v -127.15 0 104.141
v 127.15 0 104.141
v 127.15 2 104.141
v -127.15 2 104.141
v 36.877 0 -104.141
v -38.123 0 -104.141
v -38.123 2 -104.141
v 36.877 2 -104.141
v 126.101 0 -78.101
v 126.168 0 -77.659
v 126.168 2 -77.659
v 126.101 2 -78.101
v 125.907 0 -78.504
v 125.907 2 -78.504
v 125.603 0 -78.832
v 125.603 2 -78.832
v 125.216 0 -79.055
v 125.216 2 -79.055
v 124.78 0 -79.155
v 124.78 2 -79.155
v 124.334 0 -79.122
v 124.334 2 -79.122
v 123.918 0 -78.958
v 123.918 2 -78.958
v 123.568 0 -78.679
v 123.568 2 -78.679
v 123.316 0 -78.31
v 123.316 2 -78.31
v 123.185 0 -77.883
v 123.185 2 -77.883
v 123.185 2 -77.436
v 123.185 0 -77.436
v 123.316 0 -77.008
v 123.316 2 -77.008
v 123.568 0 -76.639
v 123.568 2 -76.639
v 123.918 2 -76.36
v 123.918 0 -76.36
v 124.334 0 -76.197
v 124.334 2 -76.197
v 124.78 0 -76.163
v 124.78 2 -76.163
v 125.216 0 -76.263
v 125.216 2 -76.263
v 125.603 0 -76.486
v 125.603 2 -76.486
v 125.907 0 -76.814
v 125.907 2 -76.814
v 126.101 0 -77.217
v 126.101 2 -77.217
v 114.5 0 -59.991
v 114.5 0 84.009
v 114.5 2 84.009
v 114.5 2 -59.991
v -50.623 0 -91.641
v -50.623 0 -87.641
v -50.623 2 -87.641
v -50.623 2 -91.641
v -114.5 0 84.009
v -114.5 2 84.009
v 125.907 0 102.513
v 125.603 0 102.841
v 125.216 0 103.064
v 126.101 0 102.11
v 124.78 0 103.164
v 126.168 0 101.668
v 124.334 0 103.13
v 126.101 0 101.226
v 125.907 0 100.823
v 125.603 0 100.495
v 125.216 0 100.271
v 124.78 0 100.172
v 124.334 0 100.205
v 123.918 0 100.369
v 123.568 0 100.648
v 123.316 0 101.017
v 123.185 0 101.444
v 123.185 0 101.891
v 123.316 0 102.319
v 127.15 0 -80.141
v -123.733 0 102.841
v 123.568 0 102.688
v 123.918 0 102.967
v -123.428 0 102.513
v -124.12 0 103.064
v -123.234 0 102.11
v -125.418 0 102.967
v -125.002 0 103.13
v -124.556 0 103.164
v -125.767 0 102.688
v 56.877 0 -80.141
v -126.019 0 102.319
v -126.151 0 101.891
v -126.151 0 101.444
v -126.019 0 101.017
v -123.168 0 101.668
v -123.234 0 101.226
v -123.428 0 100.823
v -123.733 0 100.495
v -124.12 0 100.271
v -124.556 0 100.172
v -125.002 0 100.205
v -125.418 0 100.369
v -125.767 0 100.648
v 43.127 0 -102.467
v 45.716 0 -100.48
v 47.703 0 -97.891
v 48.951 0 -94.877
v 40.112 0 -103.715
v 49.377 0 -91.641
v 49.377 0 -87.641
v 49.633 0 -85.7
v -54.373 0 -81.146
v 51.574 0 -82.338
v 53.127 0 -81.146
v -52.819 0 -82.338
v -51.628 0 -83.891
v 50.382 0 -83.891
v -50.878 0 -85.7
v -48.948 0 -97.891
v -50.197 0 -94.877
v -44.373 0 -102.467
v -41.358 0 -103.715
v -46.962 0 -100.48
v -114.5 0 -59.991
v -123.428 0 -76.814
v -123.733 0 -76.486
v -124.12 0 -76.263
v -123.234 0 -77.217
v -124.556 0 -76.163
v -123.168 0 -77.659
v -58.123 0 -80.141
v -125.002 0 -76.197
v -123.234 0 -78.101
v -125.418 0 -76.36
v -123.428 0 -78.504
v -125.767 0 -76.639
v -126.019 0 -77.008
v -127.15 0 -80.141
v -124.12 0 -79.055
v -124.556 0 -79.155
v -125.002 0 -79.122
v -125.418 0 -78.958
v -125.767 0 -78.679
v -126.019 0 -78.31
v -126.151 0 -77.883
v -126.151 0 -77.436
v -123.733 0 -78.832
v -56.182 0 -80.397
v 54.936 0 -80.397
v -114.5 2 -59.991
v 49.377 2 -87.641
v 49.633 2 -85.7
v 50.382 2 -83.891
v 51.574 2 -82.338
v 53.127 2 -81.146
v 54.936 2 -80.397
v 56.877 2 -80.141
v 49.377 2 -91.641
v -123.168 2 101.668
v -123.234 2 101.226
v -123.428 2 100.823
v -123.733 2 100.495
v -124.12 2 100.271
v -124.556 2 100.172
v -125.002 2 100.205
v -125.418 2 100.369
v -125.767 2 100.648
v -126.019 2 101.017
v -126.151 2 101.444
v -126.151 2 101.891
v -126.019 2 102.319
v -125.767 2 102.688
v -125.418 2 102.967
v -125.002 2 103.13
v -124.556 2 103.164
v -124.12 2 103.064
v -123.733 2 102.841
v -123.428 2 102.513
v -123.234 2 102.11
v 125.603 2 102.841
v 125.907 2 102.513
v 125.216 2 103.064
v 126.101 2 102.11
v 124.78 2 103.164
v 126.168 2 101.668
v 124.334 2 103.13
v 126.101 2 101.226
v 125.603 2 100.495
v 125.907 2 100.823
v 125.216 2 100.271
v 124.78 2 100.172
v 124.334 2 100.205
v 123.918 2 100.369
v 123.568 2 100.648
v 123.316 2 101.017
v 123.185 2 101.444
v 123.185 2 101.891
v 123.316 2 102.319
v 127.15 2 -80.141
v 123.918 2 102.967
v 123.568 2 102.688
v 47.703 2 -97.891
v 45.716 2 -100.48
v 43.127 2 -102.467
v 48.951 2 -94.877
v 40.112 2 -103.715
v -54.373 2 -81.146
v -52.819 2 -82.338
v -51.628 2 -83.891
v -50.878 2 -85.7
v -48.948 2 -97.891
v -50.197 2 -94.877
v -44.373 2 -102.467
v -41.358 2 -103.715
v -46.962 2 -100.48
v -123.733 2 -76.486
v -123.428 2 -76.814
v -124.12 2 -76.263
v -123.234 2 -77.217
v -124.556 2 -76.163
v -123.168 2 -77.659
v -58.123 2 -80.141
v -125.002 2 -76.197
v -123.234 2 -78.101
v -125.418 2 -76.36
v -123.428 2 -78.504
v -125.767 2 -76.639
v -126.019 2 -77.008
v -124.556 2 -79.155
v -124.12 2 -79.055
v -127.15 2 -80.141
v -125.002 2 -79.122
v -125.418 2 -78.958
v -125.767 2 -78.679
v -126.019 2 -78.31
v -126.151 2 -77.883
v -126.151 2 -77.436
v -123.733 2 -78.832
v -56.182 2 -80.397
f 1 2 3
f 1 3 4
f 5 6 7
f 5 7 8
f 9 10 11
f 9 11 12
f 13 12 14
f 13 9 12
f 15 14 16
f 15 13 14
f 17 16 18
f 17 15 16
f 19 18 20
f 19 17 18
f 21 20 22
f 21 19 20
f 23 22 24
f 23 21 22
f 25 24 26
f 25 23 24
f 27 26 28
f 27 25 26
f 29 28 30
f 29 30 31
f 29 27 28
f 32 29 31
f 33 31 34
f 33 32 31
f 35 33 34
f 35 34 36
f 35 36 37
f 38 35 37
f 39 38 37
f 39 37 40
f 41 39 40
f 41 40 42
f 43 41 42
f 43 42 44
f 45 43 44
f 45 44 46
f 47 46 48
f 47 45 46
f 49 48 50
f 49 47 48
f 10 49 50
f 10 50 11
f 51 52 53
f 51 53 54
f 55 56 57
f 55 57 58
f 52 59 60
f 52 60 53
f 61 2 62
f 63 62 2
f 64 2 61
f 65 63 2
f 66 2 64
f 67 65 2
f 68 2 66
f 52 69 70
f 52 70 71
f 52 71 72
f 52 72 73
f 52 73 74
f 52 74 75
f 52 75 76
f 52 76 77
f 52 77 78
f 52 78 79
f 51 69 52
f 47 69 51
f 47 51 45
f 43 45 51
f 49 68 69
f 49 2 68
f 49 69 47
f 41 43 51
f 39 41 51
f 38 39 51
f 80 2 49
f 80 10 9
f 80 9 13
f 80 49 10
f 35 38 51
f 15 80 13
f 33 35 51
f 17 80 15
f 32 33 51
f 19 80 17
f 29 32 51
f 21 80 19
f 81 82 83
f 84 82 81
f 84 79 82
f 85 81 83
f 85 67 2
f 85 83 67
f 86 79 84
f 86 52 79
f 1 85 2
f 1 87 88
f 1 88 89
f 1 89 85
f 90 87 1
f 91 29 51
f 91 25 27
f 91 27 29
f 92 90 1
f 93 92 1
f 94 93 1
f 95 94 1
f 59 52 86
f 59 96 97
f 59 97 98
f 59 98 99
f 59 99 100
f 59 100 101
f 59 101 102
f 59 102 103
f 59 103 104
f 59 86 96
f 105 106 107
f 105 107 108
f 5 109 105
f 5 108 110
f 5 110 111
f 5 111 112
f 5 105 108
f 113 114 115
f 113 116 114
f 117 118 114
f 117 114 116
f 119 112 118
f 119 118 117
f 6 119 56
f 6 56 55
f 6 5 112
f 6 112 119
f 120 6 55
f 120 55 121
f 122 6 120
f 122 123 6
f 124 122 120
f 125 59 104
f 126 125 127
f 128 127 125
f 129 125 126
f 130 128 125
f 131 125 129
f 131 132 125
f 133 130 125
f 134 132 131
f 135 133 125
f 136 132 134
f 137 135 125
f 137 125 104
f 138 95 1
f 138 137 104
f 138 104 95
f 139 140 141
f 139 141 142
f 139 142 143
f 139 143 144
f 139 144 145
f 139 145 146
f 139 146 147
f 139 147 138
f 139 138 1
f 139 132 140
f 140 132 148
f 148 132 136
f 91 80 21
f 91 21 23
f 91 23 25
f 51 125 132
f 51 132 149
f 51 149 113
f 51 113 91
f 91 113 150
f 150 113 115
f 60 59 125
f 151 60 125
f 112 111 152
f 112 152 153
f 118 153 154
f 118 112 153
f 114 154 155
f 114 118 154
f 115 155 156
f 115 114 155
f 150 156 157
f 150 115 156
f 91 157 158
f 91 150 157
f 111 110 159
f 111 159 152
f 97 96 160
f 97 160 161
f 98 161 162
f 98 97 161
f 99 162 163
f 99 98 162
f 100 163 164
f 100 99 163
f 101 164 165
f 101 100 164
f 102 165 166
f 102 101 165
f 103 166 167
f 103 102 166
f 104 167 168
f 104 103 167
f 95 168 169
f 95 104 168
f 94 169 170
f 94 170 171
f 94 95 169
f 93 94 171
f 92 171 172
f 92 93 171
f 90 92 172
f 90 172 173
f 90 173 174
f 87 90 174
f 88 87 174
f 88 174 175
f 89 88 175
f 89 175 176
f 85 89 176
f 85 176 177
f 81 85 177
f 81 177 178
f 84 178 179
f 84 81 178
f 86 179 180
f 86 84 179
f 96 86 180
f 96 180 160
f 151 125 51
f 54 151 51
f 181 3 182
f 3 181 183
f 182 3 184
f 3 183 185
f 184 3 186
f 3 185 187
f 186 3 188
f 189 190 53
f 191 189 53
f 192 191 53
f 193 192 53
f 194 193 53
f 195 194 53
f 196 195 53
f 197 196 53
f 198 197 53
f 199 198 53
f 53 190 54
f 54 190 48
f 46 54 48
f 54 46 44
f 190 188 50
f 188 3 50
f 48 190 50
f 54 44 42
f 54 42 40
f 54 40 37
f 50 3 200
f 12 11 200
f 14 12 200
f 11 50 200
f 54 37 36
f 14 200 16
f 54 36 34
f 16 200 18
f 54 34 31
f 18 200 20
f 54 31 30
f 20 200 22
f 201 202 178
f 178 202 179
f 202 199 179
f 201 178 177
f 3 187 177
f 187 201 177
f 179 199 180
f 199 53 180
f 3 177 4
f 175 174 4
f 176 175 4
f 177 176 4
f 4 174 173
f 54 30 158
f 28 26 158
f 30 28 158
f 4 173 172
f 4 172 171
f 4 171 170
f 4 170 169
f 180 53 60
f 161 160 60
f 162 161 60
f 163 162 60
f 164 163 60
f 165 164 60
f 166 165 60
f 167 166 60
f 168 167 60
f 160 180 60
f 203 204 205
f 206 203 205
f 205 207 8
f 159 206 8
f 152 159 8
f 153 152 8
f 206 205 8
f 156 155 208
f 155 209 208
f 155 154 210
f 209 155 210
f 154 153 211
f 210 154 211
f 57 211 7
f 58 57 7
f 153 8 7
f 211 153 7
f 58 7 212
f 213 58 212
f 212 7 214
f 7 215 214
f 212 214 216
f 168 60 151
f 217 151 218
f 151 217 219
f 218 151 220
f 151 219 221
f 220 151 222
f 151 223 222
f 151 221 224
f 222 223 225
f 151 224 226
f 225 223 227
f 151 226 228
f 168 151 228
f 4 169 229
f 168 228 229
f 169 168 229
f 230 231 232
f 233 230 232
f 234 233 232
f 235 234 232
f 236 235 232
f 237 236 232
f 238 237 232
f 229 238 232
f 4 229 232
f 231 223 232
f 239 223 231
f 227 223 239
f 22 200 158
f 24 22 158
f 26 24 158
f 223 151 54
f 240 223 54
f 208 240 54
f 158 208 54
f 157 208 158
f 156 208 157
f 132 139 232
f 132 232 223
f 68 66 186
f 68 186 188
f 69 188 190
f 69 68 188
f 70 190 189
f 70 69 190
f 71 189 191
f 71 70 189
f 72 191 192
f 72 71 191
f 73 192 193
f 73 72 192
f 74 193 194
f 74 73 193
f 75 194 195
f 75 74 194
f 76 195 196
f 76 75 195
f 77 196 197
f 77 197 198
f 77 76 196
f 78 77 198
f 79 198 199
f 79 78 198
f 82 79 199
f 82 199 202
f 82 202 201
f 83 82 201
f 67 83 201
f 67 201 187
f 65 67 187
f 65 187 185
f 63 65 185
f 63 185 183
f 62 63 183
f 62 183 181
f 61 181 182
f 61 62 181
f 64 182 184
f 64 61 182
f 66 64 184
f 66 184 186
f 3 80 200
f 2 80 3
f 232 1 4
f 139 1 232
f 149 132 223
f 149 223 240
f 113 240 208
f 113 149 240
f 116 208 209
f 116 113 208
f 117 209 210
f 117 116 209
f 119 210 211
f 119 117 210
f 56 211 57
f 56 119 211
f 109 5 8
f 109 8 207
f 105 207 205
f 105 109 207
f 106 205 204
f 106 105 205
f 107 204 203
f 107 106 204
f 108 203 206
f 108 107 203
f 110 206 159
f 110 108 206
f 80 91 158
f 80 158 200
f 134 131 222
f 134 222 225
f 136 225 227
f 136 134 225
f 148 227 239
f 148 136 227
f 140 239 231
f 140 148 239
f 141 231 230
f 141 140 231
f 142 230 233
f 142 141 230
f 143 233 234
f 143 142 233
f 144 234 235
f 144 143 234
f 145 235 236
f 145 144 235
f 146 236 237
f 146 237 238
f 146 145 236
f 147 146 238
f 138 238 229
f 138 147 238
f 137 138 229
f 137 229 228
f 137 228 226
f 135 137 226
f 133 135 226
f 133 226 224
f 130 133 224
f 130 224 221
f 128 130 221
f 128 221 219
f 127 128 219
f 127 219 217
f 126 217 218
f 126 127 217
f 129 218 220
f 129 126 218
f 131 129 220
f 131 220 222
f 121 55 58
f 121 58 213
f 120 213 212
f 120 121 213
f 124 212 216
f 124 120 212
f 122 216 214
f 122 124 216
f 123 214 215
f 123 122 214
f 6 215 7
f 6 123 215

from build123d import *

# Parameters (mm, degrees)
SKETCH3_R           = 1.5
SKETCH3_W           = 229
SKETCH3_H           = 144
BOSS_EXTRUDE2_DEPTH = 2


with BuildPart() as part:
    # Sketch3 → Boss-Extrude2 (new body)
    with BuildSketch(Plane(origin=(0, 0, 0), x_dir=(1, 0, 0), z_dir=(0, 1, 0))):
        with BuildLine():
            Line((-127.15, 80.141387187), (-58.12279793, 80.141387187))
            ThreePointArc((-58.12279793, 80.141387187), (-52.819497071, 82.338086328), (-50.62279793, 87.641387187))
            Line((-50.62279793, 87.641387187), (-50.62279793, 91.641387187))
            ThreePointArc((-50.62279793, 91.641387187), (-46.961632695, 100.480221952), (-38.12279793, 104.141387187))
            Line((-38.12279793, 104.141387187), (36.87720207, 104.141387187))
            ThreePointArc((36.87720207, 104.141387187), (45.716036835, 100.480221952), (49.37720207, 91.641387187))
            Line((49.37720207, 91.641387187), (49.37720207, 87.641387187))
            ThreePointArc((49.37720207, 87.641387187), (51.573901211, 82.338086328), (56.87720207, 80.141387187))
            Line((56.87720207, 80.141387187), (127.15, 80.141387187))
            Line((127.15, 80.141387187), (127.15, -104.141387187))
            Line((127.15, -104.141387187), (-127.15, -104.141387187))
            Line((-127.15, -104.141387187), (-127.15, 80.141387187))
        make_face()
        with Locations((-124.667766953, 77.65915414)):
            Circle(SKETCH3_R, mode=Mode.SUBTRACT)
        with Locations((124.667766953, 77.65915414)):
            Circle(SKETCH3_R, mode=Mode.SUBTRACT)
        with Locations((124.667766953, -101.667766953)):
            Circle(SKETCH3_R, mode=Mode.SUBTRACT)
        with Locations((-124.667766953, -101.667766953)):
            Circle(SKETCH3_R, mode=Mode.SUBTRACT)
        with Locations((0, -12.008612813)):
            Rectangle(SKETCH3_W, SKETCH3_H, mode=Mode.SUBTRACT)
    extrude(amount=BOSS_EXTRUDE2_DEPTH)


solid = part.part
